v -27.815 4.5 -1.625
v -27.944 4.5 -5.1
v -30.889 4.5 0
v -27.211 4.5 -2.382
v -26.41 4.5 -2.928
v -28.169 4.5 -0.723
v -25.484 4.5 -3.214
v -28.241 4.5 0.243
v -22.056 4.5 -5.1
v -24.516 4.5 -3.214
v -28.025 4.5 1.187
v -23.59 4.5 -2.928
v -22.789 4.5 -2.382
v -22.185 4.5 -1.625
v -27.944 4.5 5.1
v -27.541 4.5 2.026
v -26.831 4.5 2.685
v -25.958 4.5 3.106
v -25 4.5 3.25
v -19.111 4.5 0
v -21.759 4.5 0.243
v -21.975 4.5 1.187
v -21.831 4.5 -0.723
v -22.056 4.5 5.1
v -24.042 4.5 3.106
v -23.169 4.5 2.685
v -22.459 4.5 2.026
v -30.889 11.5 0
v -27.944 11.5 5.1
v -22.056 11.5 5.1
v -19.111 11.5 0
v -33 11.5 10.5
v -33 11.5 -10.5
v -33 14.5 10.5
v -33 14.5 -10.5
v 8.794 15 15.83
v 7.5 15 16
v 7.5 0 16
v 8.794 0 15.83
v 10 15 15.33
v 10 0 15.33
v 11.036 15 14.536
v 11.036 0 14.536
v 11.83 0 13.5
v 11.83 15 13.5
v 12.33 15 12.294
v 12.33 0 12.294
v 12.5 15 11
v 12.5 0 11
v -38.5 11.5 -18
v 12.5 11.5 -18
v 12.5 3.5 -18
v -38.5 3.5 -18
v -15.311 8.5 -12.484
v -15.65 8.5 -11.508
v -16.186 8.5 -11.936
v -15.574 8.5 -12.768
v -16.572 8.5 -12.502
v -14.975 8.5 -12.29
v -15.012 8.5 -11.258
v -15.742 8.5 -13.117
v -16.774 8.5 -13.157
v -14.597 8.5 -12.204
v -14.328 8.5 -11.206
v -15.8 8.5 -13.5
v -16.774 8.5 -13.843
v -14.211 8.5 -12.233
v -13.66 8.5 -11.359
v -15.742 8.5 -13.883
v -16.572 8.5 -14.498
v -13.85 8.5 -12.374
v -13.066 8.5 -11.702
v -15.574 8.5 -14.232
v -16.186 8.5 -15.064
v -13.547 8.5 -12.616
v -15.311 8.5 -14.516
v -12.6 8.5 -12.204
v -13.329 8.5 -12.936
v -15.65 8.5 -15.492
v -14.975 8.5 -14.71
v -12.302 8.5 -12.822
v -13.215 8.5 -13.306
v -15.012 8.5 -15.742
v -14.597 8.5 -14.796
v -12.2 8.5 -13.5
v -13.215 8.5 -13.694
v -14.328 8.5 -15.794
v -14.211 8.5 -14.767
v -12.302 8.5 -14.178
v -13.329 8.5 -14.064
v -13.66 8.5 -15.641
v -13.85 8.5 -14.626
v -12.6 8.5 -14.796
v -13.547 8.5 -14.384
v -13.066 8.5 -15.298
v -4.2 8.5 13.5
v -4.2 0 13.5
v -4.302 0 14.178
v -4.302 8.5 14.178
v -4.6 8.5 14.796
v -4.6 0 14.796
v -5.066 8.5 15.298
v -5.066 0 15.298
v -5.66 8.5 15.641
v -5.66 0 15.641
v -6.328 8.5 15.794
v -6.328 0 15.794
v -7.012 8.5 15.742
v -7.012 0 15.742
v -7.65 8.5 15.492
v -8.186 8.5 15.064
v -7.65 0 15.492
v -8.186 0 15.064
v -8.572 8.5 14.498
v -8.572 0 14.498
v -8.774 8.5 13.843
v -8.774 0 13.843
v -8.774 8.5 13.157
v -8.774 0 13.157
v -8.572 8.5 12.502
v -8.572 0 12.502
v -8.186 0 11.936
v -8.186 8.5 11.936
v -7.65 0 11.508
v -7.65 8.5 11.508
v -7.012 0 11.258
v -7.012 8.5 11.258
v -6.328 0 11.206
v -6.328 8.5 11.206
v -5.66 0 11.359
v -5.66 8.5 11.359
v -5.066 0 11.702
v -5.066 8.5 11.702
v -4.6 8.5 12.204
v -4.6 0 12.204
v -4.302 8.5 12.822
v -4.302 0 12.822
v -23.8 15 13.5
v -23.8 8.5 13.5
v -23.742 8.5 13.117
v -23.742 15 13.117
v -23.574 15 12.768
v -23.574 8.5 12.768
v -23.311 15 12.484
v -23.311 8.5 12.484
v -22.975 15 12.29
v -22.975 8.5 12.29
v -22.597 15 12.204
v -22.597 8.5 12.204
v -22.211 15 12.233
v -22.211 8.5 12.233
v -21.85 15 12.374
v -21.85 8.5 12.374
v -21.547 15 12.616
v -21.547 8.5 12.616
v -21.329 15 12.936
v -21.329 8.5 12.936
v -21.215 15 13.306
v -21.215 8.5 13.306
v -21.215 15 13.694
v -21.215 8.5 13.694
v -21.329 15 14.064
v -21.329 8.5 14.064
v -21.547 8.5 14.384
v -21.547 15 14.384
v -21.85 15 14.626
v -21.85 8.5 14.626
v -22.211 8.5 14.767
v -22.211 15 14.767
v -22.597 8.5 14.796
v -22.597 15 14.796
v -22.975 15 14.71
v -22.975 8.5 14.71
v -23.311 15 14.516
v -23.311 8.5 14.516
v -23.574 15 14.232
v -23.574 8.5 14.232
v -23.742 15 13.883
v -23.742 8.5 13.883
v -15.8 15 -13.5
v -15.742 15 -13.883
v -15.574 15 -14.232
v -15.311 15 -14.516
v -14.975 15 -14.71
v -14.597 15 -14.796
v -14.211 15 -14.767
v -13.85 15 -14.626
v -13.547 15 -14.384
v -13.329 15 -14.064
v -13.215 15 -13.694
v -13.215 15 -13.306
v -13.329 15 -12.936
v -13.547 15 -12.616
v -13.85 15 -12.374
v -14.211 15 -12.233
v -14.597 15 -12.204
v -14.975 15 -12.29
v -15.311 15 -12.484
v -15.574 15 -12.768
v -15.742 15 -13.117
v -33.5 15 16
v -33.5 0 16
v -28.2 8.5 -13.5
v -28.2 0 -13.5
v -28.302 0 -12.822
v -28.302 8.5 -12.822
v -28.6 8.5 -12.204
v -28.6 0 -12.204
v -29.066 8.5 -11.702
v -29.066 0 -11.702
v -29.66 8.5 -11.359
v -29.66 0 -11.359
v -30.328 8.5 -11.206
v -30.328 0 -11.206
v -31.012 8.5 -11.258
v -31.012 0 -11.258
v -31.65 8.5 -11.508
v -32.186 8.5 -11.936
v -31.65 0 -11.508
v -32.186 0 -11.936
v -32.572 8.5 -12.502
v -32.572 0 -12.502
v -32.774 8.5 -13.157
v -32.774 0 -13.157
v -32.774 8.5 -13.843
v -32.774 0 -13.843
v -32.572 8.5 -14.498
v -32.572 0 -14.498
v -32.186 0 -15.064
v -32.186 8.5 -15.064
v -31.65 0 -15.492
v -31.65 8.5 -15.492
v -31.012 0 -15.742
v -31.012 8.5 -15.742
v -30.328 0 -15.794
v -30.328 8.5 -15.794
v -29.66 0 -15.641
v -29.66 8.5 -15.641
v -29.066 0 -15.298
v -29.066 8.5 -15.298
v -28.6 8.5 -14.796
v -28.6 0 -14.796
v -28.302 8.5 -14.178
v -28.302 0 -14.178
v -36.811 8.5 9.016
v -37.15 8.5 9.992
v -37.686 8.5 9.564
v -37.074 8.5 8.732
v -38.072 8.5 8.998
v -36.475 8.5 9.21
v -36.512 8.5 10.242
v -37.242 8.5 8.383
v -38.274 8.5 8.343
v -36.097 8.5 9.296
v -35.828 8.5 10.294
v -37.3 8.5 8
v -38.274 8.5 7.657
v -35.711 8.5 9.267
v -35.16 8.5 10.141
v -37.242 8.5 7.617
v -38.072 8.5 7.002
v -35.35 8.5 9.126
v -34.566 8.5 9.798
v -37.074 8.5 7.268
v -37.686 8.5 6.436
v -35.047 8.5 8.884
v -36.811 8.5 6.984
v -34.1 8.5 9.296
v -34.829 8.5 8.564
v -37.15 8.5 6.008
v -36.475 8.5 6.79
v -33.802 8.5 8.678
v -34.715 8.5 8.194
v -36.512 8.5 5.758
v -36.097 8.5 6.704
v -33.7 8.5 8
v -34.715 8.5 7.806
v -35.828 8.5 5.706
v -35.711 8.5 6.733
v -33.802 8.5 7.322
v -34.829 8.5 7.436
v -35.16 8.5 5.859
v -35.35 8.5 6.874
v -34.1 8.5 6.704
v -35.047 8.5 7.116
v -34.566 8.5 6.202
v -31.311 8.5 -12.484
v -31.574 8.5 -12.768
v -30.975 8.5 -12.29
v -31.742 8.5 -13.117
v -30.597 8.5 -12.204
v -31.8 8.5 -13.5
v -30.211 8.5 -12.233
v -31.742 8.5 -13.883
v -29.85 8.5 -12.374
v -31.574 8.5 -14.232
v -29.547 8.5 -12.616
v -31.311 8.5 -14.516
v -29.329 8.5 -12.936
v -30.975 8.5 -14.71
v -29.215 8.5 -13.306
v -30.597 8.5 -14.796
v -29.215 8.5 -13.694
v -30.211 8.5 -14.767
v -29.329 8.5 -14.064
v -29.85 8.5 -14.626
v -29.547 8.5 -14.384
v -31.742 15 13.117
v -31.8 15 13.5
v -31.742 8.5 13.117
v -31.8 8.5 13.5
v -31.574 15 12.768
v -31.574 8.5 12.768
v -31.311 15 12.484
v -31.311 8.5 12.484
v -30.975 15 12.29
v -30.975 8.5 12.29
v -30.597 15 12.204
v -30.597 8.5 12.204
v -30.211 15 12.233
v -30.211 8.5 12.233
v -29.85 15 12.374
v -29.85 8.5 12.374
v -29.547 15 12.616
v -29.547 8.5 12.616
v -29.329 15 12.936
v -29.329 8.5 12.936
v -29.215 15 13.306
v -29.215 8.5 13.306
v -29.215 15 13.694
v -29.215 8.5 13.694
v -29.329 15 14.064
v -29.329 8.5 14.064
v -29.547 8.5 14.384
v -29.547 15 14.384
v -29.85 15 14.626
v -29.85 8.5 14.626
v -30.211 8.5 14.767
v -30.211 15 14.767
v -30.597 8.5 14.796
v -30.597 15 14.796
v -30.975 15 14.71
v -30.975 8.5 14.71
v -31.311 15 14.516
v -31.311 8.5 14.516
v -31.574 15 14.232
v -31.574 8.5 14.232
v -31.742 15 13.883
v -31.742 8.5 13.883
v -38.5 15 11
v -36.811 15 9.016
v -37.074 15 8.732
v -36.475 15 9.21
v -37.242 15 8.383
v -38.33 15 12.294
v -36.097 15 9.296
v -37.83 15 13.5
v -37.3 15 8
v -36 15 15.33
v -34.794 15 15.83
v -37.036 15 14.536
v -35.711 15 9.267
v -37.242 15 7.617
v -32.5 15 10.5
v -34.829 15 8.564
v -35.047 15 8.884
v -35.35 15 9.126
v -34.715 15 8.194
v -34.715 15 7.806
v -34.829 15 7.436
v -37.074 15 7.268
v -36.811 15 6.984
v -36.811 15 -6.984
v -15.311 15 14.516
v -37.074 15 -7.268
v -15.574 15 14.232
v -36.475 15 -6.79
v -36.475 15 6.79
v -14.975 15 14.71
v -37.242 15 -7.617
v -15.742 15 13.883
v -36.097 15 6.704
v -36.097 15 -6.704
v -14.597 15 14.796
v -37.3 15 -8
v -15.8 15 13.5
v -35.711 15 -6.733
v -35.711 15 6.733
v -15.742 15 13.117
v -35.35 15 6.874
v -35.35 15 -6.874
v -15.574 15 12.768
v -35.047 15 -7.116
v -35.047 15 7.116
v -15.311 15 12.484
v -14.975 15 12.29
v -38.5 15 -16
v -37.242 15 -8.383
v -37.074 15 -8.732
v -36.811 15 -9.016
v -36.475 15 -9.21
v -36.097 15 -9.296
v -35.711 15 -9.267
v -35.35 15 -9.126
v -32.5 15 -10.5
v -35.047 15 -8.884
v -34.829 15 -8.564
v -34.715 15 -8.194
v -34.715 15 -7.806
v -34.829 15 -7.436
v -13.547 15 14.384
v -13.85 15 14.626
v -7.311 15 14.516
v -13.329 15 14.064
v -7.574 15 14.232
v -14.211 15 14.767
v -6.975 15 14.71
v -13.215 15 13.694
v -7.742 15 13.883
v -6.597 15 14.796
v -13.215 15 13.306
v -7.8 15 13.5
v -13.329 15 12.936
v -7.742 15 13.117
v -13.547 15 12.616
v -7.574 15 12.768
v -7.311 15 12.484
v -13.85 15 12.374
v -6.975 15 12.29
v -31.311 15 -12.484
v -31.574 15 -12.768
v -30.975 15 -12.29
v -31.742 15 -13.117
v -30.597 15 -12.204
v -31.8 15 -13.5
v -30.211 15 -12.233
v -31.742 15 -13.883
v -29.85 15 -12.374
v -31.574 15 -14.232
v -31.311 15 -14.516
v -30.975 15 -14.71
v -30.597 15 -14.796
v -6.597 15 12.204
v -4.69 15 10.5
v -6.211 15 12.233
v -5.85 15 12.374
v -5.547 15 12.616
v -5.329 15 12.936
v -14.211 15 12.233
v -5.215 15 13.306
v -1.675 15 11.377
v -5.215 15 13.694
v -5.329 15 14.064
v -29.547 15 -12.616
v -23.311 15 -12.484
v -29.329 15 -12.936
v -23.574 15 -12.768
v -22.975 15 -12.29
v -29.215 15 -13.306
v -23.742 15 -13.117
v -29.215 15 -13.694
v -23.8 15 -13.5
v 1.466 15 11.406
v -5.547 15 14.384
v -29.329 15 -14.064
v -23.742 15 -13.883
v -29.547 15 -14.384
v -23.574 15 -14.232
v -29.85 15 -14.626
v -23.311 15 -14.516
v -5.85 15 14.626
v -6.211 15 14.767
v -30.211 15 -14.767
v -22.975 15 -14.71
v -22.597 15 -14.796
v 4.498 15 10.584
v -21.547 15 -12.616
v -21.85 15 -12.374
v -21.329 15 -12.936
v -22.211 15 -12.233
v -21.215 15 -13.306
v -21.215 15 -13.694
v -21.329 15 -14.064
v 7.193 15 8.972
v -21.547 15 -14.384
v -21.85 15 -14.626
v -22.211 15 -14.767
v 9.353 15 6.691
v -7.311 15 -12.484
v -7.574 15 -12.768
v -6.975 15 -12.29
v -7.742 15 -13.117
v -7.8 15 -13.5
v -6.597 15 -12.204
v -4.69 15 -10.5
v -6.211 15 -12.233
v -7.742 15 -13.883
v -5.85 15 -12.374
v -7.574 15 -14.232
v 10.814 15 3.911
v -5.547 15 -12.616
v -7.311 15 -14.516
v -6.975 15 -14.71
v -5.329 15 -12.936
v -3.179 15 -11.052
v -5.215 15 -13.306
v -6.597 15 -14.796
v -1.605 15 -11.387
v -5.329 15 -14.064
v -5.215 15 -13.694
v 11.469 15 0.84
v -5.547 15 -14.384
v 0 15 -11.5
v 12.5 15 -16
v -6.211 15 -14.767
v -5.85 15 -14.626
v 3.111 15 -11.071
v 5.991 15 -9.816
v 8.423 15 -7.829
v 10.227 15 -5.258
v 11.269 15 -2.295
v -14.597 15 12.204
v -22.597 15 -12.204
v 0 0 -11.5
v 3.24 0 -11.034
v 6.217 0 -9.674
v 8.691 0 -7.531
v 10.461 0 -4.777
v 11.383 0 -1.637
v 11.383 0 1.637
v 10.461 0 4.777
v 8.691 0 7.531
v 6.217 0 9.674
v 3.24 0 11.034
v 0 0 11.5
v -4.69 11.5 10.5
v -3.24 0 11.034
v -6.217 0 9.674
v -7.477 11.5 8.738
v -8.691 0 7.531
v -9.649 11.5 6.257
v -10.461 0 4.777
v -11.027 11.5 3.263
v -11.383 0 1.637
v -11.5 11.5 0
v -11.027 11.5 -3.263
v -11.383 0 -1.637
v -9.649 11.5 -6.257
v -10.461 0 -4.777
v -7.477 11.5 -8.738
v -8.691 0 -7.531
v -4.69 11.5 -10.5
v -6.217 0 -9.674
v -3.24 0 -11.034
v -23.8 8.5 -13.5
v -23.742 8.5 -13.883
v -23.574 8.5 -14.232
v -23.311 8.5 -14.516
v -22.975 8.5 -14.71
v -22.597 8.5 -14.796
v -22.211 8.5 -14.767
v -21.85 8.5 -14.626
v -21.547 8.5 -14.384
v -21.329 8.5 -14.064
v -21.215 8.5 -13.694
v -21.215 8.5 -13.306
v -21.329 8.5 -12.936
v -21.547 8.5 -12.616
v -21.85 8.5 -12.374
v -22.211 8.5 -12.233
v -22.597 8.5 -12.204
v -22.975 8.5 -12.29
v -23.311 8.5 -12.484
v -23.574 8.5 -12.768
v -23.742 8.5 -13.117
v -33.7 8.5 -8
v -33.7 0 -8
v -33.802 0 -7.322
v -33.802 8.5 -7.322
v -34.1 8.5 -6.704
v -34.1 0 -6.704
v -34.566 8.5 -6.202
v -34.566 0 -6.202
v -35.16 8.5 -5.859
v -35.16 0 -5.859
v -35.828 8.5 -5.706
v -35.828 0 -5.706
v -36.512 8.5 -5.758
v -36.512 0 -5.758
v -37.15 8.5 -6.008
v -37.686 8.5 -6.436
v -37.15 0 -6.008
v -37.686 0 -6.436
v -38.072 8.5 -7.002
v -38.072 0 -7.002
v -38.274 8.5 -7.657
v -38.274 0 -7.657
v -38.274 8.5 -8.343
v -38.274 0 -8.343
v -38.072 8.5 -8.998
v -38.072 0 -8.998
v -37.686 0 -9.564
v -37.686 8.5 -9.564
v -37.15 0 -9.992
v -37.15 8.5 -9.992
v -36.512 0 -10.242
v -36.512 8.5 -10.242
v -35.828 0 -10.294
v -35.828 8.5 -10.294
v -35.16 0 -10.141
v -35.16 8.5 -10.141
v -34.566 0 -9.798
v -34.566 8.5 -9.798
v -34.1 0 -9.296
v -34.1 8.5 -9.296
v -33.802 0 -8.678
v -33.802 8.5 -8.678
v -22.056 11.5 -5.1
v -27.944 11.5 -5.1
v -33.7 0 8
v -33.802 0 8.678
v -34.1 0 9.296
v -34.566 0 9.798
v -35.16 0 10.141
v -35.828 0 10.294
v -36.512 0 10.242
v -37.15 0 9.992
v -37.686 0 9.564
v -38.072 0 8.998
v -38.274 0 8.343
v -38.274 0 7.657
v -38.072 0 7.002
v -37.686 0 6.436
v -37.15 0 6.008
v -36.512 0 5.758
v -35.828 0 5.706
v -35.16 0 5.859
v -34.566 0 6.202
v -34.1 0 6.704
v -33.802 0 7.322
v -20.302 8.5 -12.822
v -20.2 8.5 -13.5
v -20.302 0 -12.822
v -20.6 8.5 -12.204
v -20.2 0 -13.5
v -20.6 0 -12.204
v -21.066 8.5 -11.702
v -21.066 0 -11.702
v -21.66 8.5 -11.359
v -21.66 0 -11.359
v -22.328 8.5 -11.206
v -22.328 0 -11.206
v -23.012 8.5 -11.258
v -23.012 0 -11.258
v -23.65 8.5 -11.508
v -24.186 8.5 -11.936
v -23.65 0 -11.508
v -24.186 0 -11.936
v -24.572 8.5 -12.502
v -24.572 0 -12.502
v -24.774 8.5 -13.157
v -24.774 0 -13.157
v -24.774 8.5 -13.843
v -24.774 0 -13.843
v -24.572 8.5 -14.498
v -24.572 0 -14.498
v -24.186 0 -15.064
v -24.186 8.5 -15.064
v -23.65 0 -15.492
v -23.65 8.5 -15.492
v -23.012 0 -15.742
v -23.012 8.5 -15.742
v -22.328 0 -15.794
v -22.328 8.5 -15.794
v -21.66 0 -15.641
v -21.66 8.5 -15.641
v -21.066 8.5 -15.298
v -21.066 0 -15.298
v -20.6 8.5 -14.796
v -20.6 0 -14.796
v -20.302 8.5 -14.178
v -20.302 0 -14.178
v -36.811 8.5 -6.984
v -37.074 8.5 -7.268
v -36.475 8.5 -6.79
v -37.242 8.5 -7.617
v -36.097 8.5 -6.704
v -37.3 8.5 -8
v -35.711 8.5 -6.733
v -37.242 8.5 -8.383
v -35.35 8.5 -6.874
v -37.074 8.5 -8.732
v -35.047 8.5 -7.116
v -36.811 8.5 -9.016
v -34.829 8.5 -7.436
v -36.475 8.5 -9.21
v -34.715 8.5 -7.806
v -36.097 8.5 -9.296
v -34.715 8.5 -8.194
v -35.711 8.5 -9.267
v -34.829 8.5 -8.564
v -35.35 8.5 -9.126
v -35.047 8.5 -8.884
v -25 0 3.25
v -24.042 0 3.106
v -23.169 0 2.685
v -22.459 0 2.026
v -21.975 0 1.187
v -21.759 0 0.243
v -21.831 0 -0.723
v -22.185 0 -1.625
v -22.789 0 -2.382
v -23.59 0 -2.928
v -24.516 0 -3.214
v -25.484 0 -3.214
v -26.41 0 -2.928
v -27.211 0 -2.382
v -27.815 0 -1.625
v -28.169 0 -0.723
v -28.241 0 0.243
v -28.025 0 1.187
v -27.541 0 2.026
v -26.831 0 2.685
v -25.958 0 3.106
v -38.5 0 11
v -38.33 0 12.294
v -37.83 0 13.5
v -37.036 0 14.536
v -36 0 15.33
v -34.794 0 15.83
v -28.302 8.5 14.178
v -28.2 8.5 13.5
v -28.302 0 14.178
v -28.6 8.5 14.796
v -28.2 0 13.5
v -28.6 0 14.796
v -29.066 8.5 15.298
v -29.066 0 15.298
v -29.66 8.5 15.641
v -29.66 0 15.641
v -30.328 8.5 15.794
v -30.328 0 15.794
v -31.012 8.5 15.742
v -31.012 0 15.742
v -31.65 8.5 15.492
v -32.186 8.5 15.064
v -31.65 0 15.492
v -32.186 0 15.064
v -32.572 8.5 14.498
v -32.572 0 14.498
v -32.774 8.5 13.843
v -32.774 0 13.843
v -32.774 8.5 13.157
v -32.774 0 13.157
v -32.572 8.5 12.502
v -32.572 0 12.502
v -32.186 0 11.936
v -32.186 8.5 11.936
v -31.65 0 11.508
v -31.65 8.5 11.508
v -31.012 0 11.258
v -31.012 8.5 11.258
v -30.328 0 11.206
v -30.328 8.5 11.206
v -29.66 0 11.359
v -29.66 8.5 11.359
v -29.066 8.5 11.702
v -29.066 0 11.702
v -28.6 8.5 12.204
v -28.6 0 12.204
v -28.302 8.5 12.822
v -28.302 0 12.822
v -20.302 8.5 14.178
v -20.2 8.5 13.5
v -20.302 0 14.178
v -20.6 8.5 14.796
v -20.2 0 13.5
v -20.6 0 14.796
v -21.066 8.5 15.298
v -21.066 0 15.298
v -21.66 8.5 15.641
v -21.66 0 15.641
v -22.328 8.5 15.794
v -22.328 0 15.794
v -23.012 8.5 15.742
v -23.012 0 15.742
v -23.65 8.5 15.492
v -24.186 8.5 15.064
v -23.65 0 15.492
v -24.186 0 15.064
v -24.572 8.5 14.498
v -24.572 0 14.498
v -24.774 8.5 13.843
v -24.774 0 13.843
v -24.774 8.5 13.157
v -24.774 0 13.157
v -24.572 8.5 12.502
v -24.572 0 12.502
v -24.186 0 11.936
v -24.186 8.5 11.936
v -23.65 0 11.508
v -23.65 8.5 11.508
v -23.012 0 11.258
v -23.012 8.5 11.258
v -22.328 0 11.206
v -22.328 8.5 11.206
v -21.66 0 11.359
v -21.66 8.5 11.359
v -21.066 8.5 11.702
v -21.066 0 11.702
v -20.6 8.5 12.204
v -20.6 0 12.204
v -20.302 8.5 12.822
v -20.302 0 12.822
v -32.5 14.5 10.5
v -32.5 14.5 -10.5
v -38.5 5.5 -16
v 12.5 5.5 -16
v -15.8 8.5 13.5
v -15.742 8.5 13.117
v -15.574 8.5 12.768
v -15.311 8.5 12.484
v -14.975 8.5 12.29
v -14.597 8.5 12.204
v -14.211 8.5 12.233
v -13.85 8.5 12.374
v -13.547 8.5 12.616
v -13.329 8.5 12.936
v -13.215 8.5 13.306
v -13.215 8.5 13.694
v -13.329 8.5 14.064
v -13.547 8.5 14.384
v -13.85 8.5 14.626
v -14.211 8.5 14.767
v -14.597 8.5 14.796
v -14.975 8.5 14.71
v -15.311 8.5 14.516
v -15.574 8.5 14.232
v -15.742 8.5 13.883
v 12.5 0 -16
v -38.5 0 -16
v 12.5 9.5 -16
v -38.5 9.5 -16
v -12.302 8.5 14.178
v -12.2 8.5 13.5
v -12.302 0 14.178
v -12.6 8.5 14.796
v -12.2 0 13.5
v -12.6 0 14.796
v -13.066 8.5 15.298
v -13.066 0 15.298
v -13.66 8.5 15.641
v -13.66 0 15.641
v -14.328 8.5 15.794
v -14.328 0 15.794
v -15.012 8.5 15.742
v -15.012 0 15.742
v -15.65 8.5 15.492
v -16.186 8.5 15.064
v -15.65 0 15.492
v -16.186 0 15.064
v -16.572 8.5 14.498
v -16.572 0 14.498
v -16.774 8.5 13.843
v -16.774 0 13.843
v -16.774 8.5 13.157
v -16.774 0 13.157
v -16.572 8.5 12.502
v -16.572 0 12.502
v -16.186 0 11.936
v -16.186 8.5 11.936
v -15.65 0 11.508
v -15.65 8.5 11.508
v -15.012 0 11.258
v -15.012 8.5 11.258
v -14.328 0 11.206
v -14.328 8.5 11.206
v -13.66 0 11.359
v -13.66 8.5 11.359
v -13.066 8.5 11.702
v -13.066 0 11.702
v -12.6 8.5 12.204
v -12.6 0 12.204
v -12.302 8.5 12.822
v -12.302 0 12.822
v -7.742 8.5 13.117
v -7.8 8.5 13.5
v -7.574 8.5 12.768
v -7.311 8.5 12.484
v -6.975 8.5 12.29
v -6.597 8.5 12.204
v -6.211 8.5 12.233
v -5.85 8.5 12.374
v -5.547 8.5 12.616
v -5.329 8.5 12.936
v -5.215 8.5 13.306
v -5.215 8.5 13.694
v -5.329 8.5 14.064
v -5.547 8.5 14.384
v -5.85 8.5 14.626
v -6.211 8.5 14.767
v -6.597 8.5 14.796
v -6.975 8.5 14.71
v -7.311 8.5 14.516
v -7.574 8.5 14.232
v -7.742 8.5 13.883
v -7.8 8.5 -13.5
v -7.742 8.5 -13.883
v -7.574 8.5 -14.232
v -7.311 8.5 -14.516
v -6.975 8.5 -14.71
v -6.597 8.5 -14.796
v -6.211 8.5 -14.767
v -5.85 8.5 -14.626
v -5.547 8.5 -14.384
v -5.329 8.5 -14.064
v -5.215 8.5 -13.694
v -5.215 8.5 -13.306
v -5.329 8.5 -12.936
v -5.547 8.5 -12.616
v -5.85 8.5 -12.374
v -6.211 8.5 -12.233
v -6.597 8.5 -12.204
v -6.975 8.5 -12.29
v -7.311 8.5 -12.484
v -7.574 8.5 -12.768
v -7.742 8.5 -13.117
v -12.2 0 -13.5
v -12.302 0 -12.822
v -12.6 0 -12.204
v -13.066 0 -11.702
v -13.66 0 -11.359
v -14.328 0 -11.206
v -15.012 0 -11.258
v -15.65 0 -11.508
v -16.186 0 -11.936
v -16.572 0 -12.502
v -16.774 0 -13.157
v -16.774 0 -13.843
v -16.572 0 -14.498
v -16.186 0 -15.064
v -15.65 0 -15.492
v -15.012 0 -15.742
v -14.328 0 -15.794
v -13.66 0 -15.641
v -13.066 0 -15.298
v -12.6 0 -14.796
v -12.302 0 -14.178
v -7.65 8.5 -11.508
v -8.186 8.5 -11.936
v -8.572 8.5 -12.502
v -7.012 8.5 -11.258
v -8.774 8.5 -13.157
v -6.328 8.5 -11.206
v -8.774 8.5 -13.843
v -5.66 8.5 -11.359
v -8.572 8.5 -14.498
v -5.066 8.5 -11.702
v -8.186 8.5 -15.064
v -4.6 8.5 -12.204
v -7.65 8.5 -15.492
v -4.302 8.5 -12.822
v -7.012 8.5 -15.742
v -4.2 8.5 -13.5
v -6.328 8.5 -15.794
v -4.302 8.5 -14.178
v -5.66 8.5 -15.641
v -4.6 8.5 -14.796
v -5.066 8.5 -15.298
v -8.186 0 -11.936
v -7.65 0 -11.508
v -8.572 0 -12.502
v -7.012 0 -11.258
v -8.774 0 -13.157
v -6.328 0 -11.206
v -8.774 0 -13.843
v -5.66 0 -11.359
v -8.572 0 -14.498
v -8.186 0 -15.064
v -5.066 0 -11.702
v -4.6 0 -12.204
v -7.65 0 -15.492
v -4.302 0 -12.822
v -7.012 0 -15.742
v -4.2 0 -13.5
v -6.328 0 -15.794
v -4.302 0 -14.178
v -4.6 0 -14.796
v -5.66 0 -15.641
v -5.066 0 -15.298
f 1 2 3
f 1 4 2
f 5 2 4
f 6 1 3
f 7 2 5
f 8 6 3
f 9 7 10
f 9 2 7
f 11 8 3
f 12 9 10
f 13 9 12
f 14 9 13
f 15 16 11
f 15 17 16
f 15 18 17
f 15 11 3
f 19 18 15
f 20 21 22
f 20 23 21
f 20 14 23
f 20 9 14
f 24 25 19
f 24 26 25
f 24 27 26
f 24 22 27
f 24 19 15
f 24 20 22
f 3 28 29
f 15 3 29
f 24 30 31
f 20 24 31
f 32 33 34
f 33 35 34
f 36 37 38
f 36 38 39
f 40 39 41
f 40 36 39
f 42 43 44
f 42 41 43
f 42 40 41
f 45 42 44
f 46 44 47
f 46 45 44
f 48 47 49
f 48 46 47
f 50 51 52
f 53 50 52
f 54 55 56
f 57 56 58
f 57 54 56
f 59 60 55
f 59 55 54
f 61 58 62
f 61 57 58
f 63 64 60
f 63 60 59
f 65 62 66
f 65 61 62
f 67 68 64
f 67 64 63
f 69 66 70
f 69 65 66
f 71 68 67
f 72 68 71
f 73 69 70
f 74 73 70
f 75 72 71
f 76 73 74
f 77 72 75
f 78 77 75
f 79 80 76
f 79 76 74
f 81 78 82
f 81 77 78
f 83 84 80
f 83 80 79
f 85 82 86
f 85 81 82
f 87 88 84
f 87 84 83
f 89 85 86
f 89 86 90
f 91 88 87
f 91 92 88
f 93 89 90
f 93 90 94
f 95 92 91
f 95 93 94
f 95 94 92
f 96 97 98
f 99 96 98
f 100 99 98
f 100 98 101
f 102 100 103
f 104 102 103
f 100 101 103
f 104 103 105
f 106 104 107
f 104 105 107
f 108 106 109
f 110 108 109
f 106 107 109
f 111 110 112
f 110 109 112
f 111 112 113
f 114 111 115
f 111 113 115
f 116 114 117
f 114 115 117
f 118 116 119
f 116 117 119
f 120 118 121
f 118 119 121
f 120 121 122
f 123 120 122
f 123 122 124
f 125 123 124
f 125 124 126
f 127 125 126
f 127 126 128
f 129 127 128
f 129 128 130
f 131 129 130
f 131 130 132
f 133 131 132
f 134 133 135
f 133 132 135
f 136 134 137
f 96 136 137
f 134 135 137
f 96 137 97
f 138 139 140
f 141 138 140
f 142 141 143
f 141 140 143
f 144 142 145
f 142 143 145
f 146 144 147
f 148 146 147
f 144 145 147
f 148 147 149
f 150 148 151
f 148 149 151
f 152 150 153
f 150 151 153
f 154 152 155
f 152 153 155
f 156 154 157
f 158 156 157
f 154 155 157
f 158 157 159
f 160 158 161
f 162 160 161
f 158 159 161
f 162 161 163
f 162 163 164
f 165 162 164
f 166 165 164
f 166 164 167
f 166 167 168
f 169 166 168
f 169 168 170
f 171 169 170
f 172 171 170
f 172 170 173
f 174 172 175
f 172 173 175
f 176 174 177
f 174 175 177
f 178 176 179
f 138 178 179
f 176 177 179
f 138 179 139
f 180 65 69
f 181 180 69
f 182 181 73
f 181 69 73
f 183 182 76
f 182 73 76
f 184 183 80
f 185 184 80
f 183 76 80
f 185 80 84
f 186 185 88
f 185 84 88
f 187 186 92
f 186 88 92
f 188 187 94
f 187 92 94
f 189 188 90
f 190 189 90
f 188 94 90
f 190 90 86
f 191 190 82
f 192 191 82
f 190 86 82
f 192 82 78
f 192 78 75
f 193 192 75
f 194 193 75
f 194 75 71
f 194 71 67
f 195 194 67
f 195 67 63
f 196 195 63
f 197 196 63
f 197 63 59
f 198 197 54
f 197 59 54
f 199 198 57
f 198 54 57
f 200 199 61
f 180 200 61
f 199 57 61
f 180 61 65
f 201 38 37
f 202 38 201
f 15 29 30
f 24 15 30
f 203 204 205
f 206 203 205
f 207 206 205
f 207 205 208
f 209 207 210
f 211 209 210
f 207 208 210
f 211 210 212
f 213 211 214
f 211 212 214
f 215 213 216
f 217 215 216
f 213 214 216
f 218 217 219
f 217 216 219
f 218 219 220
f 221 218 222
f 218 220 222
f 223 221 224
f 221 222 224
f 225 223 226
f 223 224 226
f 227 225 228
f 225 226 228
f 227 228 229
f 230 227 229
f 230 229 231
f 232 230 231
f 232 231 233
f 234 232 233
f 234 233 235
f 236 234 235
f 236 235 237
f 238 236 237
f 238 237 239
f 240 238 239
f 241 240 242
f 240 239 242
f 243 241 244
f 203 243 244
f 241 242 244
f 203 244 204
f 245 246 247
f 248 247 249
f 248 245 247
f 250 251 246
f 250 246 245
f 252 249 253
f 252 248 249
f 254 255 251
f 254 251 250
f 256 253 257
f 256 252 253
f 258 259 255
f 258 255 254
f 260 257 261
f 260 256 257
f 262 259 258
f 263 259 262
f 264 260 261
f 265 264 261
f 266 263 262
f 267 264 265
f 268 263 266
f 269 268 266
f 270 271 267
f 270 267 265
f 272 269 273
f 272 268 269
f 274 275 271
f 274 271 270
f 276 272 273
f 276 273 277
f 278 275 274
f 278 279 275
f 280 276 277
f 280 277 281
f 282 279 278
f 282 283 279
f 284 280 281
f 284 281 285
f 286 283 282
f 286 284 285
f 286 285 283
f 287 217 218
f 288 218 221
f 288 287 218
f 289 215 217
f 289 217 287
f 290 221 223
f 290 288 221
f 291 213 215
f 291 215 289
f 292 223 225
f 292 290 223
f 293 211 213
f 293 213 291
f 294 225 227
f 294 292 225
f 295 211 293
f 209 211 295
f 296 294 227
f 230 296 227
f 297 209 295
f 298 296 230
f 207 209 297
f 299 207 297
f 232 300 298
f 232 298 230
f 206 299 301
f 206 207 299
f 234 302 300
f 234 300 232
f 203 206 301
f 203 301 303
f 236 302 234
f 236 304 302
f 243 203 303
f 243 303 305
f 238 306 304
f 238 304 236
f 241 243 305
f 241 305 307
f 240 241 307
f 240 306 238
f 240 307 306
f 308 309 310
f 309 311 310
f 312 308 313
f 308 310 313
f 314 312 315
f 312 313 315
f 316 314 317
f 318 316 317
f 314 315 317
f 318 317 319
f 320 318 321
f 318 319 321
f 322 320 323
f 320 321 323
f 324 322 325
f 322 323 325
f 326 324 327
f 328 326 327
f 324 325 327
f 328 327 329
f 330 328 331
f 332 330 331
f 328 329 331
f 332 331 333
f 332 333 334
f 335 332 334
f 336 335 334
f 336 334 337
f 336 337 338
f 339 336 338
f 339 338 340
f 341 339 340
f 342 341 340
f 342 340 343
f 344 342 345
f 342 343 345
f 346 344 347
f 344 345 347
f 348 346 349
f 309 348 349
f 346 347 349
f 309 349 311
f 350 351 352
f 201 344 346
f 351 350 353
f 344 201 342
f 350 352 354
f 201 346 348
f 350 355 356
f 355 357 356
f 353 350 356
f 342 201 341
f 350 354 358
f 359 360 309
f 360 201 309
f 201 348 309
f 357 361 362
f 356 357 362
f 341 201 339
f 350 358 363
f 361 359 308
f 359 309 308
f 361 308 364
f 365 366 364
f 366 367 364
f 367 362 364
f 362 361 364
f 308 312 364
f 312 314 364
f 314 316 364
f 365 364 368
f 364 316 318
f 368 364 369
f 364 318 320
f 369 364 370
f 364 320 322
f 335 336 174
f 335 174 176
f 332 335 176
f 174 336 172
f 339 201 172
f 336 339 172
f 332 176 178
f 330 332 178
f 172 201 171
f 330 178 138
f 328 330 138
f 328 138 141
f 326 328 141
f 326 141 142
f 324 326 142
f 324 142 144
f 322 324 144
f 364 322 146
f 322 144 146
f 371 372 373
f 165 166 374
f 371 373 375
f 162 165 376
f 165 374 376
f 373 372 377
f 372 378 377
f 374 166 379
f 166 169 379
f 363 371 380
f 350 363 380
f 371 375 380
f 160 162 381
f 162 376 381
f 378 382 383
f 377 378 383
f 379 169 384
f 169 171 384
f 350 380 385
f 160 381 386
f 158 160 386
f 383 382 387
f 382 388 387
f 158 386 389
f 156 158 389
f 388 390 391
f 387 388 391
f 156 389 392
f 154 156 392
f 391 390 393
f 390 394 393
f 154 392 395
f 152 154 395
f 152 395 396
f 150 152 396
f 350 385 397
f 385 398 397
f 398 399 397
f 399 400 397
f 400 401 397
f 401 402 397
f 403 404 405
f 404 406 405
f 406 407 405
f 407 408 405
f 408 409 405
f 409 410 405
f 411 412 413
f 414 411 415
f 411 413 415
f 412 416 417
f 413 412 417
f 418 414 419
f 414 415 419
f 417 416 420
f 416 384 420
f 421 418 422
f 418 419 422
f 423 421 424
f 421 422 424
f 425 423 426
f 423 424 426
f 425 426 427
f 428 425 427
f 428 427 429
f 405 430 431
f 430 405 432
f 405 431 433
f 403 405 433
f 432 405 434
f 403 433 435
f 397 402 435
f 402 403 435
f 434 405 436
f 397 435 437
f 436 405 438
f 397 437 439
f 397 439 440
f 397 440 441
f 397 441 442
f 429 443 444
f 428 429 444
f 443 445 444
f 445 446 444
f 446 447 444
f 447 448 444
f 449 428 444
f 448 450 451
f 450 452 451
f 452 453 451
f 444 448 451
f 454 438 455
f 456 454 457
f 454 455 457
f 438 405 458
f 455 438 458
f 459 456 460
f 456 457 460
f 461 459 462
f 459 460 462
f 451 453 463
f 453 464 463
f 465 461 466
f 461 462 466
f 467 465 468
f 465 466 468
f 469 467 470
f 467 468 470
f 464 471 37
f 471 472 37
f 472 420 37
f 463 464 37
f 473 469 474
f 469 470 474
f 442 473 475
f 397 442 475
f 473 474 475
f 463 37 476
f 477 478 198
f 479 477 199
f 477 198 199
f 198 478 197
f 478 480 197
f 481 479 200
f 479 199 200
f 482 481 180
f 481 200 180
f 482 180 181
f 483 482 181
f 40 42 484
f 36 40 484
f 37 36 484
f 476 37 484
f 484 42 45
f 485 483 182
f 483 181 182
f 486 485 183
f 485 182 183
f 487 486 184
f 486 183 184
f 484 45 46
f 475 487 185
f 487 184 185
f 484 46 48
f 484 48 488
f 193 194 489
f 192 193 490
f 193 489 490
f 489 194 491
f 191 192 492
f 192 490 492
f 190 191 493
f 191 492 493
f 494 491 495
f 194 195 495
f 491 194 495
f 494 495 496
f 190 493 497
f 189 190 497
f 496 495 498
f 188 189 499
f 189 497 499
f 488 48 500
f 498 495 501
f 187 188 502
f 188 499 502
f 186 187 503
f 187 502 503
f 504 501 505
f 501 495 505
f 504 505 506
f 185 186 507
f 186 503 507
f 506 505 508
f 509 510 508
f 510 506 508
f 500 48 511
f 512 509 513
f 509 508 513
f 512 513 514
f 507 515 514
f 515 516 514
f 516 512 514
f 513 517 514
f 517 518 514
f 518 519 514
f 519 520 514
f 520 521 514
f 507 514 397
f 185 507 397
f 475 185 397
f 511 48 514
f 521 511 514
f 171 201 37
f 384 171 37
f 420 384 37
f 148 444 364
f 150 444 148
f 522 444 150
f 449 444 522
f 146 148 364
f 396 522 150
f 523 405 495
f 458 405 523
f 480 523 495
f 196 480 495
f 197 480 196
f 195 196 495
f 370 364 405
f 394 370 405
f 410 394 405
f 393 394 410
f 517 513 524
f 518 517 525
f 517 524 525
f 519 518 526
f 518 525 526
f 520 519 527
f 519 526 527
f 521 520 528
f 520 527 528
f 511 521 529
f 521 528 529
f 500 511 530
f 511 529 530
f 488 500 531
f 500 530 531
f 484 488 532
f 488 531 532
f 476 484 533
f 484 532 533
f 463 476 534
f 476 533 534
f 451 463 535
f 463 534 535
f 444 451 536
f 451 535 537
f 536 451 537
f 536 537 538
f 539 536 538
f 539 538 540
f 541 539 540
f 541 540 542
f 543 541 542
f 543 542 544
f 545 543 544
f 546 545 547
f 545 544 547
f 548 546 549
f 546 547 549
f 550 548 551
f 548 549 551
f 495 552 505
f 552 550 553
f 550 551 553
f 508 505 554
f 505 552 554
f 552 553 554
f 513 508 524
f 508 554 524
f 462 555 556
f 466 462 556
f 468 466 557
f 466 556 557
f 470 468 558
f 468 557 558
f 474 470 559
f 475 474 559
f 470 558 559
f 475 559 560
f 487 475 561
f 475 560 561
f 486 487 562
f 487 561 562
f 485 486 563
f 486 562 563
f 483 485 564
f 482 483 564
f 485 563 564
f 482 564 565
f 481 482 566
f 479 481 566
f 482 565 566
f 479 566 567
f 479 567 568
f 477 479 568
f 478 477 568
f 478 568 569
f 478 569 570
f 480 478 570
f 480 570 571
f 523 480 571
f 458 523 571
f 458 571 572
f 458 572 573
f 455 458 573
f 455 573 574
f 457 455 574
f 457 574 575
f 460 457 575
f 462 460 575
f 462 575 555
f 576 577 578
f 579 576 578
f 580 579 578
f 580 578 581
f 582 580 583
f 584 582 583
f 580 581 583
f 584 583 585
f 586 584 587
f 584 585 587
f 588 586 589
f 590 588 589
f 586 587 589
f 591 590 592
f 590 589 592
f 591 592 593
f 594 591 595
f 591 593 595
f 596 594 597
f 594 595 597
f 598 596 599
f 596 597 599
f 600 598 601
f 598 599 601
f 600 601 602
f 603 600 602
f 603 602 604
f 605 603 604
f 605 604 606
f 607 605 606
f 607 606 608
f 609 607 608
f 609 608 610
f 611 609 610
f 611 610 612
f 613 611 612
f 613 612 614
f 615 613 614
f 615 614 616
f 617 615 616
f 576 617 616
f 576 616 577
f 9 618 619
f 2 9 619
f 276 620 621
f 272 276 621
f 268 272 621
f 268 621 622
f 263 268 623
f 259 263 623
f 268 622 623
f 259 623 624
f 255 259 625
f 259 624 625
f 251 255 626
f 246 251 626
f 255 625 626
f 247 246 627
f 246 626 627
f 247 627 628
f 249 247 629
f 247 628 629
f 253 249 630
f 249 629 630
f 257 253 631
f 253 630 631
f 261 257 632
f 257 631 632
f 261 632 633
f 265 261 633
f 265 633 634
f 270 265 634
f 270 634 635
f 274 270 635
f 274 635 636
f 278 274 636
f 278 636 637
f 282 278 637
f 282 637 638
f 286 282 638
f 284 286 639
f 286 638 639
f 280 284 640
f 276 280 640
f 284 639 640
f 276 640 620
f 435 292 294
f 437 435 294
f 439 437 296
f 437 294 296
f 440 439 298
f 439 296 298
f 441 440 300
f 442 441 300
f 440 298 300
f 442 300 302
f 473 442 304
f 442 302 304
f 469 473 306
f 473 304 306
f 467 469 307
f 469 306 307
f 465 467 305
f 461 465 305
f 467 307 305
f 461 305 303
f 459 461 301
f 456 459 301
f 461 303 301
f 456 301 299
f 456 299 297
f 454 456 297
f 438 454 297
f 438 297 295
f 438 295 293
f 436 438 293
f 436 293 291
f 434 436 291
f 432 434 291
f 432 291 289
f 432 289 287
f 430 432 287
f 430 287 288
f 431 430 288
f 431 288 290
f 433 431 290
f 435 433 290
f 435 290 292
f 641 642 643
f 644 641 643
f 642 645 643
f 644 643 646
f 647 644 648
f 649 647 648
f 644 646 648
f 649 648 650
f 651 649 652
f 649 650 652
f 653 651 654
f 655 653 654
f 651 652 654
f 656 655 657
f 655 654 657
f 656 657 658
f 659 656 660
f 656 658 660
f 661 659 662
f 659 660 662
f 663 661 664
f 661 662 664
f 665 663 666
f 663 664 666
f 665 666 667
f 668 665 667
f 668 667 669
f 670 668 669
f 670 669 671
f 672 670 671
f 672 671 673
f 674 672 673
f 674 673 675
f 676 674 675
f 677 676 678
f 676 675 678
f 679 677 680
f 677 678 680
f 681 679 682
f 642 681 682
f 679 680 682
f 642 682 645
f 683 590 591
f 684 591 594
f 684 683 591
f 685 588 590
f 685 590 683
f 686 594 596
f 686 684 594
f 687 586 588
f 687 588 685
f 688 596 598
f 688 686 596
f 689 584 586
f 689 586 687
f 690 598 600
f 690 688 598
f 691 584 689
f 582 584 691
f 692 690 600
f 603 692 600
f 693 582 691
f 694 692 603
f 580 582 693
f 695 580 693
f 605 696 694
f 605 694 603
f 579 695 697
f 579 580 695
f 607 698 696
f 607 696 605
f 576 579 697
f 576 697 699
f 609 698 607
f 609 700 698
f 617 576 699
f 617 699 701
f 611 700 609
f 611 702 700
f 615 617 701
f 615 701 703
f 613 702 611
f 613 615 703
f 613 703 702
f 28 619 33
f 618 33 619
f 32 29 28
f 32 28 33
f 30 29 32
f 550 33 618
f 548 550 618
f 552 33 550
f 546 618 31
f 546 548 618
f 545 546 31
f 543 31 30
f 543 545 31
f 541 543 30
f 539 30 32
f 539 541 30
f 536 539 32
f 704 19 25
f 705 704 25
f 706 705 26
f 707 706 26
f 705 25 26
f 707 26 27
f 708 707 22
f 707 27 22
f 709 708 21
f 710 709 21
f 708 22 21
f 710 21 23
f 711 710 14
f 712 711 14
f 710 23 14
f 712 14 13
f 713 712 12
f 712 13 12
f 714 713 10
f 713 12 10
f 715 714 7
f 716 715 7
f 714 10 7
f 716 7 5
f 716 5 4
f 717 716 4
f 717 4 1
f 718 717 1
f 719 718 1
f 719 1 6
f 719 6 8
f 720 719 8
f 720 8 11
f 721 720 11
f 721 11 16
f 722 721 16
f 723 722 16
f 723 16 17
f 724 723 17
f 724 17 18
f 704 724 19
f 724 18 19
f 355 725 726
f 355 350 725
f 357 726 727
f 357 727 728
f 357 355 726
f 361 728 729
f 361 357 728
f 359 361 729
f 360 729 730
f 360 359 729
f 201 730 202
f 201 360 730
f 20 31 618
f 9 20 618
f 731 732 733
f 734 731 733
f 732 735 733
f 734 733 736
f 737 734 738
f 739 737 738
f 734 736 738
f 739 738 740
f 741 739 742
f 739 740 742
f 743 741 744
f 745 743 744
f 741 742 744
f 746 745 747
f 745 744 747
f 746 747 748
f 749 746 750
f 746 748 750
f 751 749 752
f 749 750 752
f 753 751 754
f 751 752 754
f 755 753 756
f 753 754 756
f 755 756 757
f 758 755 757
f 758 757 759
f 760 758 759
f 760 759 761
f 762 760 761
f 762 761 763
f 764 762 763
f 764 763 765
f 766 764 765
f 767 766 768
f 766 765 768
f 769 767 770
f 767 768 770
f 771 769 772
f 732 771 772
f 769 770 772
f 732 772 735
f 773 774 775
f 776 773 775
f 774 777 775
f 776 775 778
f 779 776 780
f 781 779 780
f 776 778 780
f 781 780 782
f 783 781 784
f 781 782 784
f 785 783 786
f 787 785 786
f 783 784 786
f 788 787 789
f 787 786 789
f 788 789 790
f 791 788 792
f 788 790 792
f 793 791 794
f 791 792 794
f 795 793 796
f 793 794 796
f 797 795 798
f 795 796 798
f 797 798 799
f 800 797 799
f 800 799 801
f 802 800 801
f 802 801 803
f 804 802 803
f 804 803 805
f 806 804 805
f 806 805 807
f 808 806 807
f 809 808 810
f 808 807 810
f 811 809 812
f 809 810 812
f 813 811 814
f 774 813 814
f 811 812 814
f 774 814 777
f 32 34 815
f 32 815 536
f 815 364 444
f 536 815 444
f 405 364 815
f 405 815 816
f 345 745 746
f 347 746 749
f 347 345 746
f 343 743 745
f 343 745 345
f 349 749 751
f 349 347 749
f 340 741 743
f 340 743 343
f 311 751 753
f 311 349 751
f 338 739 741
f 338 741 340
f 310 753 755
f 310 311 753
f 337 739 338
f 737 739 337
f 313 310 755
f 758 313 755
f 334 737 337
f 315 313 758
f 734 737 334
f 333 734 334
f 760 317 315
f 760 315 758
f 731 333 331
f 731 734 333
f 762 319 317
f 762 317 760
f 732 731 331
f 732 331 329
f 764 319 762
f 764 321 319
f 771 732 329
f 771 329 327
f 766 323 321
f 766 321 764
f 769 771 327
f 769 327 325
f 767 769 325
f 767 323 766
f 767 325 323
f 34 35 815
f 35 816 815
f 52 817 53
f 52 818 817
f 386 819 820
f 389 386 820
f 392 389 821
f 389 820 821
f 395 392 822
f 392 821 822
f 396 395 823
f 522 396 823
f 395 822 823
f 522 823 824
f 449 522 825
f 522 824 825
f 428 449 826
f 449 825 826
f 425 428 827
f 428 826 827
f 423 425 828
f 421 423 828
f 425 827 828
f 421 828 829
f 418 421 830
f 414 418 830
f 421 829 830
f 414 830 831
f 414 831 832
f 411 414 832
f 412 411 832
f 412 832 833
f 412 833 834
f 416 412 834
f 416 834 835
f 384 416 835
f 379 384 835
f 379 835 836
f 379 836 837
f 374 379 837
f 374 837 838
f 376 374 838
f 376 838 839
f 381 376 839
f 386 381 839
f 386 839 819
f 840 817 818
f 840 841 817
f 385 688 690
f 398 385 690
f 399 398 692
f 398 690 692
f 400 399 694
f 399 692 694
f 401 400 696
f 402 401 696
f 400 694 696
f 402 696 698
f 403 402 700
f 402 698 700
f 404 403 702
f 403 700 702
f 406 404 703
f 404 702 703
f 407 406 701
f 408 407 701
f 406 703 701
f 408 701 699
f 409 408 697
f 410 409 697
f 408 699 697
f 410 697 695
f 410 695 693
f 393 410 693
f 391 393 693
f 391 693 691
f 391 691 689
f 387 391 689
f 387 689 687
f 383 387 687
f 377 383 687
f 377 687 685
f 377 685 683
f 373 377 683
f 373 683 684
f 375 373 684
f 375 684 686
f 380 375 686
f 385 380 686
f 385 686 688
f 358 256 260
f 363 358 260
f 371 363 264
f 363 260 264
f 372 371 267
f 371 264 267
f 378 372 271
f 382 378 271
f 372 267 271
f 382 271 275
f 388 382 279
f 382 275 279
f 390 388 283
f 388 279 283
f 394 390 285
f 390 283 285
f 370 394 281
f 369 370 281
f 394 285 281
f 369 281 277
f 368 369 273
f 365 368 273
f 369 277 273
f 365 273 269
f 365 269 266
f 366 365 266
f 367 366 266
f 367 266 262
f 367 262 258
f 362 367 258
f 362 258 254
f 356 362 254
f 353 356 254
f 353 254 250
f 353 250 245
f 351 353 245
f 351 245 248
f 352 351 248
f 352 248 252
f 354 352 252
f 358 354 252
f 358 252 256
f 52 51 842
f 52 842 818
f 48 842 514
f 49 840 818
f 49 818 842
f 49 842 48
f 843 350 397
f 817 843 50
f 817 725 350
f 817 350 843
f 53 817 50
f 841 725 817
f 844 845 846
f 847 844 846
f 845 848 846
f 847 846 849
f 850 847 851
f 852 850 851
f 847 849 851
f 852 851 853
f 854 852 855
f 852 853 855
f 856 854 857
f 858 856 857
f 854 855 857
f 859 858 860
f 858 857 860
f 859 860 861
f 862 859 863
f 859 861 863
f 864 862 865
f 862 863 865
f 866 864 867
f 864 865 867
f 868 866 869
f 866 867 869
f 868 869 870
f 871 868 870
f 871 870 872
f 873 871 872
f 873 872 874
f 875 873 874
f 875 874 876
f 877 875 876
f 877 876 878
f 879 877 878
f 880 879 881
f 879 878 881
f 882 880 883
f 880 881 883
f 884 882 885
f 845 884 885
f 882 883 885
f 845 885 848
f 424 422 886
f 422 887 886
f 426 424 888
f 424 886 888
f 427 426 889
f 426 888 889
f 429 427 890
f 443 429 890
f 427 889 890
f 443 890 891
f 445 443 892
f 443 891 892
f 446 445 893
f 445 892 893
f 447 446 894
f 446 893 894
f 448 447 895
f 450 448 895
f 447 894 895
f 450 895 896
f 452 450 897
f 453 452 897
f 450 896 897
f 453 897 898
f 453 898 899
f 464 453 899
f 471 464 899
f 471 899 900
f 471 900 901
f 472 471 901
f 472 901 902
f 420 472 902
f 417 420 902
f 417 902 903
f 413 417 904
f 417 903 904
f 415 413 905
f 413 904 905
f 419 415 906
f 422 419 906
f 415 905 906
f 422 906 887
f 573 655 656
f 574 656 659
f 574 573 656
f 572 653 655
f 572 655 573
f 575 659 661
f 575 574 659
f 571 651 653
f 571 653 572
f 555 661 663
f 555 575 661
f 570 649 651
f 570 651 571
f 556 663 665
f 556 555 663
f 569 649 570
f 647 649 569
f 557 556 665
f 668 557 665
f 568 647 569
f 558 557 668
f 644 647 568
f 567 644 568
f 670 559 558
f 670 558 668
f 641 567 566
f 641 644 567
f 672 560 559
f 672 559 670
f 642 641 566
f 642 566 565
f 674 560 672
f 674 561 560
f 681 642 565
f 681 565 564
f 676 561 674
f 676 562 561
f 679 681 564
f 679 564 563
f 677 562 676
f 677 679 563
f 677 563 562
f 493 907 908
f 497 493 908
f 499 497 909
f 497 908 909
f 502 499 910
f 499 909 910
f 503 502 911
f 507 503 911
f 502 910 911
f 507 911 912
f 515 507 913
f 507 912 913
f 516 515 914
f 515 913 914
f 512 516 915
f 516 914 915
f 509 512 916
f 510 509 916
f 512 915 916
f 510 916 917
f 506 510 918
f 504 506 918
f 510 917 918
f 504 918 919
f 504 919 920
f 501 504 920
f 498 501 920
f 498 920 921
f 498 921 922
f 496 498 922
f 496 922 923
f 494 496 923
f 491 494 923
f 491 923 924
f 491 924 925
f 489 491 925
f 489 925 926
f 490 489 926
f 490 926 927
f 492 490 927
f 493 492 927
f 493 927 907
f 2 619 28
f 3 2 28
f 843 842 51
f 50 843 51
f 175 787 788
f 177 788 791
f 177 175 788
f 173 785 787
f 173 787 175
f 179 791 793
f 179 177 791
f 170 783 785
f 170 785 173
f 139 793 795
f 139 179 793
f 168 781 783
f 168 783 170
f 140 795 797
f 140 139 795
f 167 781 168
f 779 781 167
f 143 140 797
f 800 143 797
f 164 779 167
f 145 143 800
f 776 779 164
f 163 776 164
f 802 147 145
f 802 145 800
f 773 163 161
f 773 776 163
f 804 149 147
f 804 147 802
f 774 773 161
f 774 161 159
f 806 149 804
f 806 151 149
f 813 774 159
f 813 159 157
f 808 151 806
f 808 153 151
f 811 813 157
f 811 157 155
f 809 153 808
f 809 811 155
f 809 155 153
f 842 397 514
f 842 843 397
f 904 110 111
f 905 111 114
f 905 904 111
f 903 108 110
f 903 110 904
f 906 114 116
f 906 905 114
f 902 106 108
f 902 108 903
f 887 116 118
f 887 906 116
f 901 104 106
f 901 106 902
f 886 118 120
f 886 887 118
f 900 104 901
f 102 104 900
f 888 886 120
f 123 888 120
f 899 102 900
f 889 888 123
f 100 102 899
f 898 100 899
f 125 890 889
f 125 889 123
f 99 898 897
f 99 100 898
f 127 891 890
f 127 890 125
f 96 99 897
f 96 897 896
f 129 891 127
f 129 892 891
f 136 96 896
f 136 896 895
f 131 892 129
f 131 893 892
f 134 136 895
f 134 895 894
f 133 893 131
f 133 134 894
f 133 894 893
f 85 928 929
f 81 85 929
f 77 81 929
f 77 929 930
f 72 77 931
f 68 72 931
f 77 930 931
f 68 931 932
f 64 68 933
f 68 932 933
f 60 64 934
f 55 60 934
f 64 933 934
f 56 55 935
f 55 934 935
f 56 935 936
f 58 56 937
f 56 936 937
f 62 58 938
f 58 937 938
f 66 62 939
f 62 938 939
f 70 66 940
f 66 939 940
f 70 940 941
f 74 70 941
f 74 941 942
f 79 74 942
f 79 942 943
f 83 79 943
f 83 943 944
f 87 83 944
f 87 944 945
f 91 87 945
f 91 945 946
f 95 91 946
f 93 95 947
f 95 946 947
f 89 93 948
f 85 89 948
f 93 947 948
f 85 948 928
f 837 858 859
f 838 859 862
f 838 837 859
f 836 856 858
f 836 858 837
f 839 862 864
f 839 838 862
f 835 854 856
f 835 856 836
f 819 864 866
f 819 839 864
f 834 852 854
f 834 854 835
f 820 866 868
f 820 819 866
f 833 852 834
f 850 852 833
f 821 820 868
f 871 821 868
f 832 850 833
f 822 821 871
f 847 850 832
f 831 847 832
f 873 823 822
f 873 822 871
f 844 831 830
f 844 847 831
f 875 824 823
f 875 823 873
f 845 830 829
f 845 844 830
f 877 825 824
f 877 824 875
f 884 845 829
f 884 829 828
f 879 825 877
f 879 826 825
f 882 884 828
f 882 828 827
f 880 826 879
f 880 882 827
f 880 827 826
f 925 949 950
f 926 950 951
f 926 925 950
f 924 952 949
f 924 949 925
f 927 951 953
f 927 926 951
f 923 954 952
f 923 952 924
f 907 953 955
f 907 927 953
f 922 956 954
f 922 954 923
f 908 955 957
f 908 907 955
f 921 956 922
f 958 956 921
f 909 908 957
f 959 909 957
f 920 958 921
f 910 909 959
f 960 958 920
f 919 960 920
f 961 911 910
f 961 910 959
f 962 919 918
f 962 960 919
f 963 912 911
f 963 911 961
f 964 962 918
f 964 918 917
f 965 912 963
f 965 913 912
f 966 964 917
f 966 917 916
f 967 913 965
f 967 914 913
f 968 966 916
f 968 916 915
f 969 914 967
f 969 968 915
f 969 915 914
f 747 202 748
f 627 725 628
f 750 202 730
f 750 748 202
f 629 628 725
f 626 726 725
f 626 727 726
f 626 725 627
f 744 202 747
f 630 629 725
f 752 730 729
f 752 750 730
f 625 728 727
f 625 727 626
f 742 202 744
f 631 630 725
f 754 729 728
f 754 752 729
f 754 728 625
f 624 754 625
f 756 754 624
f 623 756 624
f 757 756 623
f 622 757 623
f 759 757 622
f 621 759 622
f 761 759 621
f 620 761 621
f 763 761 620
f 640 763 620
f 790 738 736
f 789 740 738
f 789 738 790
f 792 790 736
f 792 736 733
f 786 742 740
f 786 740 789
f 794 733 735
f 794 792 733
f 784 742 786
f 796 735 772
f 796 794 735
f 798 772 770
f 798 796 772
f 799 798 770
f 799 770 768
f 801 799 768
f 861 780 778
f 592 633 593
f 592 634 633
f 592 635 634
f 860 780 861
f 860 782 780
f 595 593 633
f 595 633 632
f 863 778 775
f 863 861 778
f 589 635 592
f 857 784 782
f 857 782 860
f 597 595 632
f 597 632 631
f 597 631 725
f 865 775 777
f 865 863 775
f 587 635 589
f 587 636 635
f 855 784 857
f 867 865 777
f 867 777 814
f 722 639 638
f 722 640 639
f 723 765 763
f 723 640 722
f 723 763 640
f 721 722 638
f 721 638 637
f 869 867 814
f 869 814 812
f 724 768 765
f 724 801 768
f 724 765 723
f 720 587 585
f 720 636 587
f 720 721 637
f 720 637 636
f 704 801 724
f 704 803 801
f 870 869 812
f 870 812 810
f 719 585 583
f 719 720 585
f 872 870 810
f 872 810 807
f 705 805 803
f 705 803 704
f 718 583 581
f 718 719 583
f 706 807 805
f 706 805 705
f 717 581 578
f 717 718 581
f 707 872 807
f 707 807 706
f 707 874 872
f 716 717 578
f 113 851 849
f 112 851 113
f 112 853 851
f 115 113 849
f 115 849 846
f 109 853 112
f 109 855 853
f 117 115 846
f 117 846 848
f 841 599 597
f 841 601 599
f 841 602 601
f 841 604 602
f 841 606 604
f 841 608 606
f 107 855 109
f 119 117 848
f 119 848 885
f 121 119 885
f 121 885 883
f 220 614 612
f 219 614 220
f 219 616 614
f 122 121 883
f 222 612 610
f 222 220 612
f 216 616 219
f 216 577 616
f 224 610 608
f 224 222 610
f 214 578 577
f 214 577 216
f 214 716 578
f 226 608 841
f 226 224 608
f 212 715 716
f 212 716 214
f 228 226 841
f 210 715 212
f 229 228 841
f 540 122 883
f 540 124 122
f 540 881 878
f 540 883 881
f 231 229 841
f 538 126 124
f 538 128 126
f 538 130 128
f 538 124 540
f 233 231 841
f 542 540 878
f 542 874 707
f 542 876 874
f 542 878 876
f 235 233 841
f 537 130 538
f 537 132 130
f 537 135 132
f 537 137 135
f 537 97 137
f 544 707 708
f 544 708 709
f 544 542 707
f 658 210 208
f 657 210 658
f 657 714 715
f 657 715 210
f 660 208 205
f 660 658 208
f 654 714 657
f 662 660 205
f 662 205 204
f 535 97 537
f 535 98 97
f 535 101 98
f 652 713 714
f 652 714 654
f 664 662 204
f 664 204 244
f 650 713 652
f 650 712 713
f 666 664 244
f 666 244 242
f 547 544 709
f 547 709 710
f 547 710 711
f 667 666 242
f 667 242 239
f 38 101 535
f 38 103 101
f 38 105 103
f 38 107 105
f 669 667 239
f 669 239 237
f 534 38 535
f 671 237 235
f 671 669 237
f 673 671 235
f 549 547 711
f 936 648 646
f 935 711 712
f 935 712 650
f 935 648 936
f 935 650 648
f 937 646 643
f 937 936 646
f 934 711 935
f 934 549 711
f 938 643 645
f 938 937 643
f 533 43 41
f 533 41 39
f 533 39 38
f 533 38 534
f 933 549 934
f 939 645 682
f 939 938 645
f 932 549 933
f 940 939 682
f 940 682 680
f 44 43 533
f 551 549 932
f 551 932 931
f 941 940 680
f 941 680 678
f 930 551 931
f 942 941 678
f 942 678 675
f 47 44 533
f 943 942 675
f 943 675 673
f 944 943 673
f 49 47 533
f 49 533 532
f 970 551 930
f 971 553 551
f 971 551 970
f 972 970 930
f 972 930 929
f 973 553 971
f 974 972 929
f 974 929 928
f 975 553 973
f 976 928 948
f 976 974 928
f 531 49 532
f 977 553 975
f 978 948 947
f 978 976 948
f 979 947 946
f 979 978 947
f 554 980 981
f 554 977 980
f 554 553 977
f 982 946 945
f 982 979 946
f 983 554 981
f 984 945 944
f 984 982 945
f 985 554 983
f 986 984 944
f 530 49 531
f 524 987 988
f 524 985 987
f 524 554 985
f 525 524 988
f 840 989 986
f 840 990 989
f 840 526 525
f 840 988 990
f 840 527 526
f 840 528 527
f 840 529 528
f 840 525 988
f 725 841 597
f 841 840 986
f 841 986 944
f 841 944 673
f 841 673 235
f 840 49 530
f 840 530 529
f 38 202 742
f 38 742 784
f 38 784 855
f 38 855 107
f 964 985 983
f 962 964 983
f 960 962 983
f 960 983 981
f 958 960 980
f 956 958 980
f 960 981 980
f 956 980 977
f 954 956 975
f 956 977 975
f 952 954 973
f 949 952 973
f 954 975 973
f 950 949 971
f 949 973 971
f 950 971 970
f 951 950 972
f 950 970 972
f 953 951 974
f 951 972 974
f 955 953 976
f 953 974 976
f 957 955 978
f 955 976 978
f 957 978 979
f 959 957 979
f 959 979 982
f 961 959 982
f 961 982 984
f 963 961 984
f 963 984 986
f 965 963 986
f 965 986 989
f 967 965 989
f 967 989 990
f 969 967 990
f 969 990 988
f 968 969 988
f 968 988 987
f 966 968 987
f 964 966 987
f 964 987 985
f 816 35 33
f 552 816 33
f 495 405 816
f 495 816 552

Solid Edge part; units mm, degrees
sketch "Sketch1" plane through (0, 0, 0) normal (0, -1, 0) x (1, 0, 0)
  line L0 (16, 20) -> (-44, 20)
  line L1 (-44, 20) -> (-44, -20)
  line L2 (-44, -20) -> (16, -20)
  line L3 (16, -20) -> (16, 20)
  dimension "D1" = 60
  dimension "D2" = 40
extrude "Protrusion1" add sketch "Sketch1" against normal blind 15
sketch "Sketch2" plane through (-14, 0, 0) normal (0, -1, 0) x (0, 0, -1)
  circle A0 centre (0, 14) radius 11.5
extrude "Cutout1" cut sketch "Sketch2" against normal through all
sketch "Sketch3" plane through (-13.5, 14.5, 0) normal (0, 1, 0) x (0, 0, 1)
  line L0 (-10.5, -19.5) -> (10.5, -19.5)
  line L1 (10.5, -19.5) -> (10.5, 13.5)
  line L2 (10.5, 13.5) -> (-10.5, 13.5)
  line L3 (-10.5, 13.5) -> (-10.5, -19.5)
  dimension "D1" = 33
  dimension "D2" = 21
extrude "VaciadoExtruido_3" cut sketch "Sketch3" against normal blind 3
hole "Agujero_7" at (-25, 11.5, 0) direction (0, -1, 0) diameter 6.5 end up to next
sketch "Sketch4" plane through (-14, 0, 15) normal (0, -1, 0) x (-1, 0, 0)
  circle A0 centre (8.5, 28.5) radius 1.3
  circle A1 centre (16.5, 28.5) radius 1.3
  circle A2 centre (-7.5, 1.5) radius 1.3
  circle A3 centre (8.5, 1.5) radius 1.3
  circle A4 centre (16.5, 1.5) radius 1.3
  circle A5 centre (22, 23) radius 1.3
  circle A6 centre (22, 7) radius 1.3
  circle A7 centre (0.5, 28.5) radius 1.3
  circle A8 centre (0.5, 1.5) radius 1.3
  circle A9 centre (-7.5, 28.5) radius 1.3
  dimension "D1" = 2.6
  dimension "D2" = 2.6
  dimension "D3" = 8
extrude "Cutout2" cut sketch "Sketch4" against normal through all
sketch "Sketch5" plane through (-18.8452, 11.5, 0) normal (0, 1, 0) x (0, 0, -1)
  line L0 (5.1, 9.0993) -> (0, 12.0438)
  line L1 (0, 12.0438) -> (-5.1, 9.0993)
  line L2 (-5.1, 9.0993) -> (-5.1, 3.2103)
  line L3 (-5.1, 3.2103) -> (0, 0.2658)
  line L4 (0, 0.2658) -> (5.1, 3.2103)
  line L5 (5.1, 3.2103) -> (5.1, 9.0993)
extrude "VaciadoExtruido_14" cut sketch "Sketch5" against normal blind 7
sketch "Sketch6" plane through (-14, 0, 0) normal (0, -1, 0) x (-1, 0, 0)
  line L0 (-26.5, -16) -> (24.5, -16)
  line L1 (24.5, -16) -> (24.5, 16)
  line L2 (24.5, 16) -> (-26.5, 16)
  line L3 (-26.5, 16) -> (-26.5, -16)
  line L4 (36.0036, -24.8602) -> (-34.0265, -24.8602)
  line L5 (-34.0265, -24.8602) -> (-34.0265, 20.7723)
  line L6 (-34.0265, 20.7723) -> (36.0036, 20.7723)
  line L7 (36.0036, 20.7723) -> (36.0036, -24.8602)
  dimension "D1" = 12.5
extrude "Cutout3" cut sketch "Sketch6" against normal through all
sketch "Sketch7" plane through (12.5, 5.75, 0) normal (1, 0, 0) x (0, -1, 0)
  line L0 (-3.75, 16) -> (-5.75, 18)
  line L1 (-5.75, 18) -> (-1.75, 18)
  line L2 (2.25, 18) -> (-1.75, 18)
  line L3 (0.25, 16) -> (2.25, 18)
  line L4 (0.25, 16) -> (-1.75, 16)
  line L5 (-3.75, 16) -> (-1.75, 16)
  dimension "D1" = 4
  dimension "D2" = 2
extrude "ProtrusiónExtruida_10" add sketch "Sketch7" against normal blind 51
fillet "Round1" radius 5 2 edges at (12.5, 7.5, 16) (-38.5, 7.5, 16)
sketch "Sketch8" plane through (-13, 15, 0) normal (0, 1, 0) x (1, 0, 0)
  line L0 (-19.5, 10.5) -> (11, 10.5)
  line L1 (11, 10.5) -> (11, -10.5)
  line L2 (11, -10.5) -> (-19.5, -10.5)
  line L3 (-19.5, -10.5) -> (-19.5, 10.5)
  dimension "D1" = 2
  dimension "D2" = 45
  dimension "D3" = 21
  dimension "D4" = 10.5
extrude "VaciadoExtruido_31" cut sketch "Sketch8" against normal blind 3
sketch "Sketch9" plane through (-13, 0, 0) normal (0, -1, 0) x (1, 0, 0)
  circle A0 centre (6.5, -13.5) radius 2.3
  circle A1 centre (-1.5, -13.5) radius 2.3
  circle A2 centre (-9.5, -13.5) radius 2.3
  circle A3 centre (-17.5, -13.5) radius 2.3
  circle A4 centre (-23, -8) radius 2.3
  circle A5 centre (-23, 8) radius 2.3
  circle A6 centre (-17.5, 13.5) radius 2.3
  circle A7 centre (-9.5, 13.5) radius 2.3
  circle A8 centre (-1.5, 13.5) radius 2.3
  circle A9 centre (6.5, 13.5) radius 2.3
extrude "Cutout4" cut sketch "Sketch9" against normal blind 8.5
